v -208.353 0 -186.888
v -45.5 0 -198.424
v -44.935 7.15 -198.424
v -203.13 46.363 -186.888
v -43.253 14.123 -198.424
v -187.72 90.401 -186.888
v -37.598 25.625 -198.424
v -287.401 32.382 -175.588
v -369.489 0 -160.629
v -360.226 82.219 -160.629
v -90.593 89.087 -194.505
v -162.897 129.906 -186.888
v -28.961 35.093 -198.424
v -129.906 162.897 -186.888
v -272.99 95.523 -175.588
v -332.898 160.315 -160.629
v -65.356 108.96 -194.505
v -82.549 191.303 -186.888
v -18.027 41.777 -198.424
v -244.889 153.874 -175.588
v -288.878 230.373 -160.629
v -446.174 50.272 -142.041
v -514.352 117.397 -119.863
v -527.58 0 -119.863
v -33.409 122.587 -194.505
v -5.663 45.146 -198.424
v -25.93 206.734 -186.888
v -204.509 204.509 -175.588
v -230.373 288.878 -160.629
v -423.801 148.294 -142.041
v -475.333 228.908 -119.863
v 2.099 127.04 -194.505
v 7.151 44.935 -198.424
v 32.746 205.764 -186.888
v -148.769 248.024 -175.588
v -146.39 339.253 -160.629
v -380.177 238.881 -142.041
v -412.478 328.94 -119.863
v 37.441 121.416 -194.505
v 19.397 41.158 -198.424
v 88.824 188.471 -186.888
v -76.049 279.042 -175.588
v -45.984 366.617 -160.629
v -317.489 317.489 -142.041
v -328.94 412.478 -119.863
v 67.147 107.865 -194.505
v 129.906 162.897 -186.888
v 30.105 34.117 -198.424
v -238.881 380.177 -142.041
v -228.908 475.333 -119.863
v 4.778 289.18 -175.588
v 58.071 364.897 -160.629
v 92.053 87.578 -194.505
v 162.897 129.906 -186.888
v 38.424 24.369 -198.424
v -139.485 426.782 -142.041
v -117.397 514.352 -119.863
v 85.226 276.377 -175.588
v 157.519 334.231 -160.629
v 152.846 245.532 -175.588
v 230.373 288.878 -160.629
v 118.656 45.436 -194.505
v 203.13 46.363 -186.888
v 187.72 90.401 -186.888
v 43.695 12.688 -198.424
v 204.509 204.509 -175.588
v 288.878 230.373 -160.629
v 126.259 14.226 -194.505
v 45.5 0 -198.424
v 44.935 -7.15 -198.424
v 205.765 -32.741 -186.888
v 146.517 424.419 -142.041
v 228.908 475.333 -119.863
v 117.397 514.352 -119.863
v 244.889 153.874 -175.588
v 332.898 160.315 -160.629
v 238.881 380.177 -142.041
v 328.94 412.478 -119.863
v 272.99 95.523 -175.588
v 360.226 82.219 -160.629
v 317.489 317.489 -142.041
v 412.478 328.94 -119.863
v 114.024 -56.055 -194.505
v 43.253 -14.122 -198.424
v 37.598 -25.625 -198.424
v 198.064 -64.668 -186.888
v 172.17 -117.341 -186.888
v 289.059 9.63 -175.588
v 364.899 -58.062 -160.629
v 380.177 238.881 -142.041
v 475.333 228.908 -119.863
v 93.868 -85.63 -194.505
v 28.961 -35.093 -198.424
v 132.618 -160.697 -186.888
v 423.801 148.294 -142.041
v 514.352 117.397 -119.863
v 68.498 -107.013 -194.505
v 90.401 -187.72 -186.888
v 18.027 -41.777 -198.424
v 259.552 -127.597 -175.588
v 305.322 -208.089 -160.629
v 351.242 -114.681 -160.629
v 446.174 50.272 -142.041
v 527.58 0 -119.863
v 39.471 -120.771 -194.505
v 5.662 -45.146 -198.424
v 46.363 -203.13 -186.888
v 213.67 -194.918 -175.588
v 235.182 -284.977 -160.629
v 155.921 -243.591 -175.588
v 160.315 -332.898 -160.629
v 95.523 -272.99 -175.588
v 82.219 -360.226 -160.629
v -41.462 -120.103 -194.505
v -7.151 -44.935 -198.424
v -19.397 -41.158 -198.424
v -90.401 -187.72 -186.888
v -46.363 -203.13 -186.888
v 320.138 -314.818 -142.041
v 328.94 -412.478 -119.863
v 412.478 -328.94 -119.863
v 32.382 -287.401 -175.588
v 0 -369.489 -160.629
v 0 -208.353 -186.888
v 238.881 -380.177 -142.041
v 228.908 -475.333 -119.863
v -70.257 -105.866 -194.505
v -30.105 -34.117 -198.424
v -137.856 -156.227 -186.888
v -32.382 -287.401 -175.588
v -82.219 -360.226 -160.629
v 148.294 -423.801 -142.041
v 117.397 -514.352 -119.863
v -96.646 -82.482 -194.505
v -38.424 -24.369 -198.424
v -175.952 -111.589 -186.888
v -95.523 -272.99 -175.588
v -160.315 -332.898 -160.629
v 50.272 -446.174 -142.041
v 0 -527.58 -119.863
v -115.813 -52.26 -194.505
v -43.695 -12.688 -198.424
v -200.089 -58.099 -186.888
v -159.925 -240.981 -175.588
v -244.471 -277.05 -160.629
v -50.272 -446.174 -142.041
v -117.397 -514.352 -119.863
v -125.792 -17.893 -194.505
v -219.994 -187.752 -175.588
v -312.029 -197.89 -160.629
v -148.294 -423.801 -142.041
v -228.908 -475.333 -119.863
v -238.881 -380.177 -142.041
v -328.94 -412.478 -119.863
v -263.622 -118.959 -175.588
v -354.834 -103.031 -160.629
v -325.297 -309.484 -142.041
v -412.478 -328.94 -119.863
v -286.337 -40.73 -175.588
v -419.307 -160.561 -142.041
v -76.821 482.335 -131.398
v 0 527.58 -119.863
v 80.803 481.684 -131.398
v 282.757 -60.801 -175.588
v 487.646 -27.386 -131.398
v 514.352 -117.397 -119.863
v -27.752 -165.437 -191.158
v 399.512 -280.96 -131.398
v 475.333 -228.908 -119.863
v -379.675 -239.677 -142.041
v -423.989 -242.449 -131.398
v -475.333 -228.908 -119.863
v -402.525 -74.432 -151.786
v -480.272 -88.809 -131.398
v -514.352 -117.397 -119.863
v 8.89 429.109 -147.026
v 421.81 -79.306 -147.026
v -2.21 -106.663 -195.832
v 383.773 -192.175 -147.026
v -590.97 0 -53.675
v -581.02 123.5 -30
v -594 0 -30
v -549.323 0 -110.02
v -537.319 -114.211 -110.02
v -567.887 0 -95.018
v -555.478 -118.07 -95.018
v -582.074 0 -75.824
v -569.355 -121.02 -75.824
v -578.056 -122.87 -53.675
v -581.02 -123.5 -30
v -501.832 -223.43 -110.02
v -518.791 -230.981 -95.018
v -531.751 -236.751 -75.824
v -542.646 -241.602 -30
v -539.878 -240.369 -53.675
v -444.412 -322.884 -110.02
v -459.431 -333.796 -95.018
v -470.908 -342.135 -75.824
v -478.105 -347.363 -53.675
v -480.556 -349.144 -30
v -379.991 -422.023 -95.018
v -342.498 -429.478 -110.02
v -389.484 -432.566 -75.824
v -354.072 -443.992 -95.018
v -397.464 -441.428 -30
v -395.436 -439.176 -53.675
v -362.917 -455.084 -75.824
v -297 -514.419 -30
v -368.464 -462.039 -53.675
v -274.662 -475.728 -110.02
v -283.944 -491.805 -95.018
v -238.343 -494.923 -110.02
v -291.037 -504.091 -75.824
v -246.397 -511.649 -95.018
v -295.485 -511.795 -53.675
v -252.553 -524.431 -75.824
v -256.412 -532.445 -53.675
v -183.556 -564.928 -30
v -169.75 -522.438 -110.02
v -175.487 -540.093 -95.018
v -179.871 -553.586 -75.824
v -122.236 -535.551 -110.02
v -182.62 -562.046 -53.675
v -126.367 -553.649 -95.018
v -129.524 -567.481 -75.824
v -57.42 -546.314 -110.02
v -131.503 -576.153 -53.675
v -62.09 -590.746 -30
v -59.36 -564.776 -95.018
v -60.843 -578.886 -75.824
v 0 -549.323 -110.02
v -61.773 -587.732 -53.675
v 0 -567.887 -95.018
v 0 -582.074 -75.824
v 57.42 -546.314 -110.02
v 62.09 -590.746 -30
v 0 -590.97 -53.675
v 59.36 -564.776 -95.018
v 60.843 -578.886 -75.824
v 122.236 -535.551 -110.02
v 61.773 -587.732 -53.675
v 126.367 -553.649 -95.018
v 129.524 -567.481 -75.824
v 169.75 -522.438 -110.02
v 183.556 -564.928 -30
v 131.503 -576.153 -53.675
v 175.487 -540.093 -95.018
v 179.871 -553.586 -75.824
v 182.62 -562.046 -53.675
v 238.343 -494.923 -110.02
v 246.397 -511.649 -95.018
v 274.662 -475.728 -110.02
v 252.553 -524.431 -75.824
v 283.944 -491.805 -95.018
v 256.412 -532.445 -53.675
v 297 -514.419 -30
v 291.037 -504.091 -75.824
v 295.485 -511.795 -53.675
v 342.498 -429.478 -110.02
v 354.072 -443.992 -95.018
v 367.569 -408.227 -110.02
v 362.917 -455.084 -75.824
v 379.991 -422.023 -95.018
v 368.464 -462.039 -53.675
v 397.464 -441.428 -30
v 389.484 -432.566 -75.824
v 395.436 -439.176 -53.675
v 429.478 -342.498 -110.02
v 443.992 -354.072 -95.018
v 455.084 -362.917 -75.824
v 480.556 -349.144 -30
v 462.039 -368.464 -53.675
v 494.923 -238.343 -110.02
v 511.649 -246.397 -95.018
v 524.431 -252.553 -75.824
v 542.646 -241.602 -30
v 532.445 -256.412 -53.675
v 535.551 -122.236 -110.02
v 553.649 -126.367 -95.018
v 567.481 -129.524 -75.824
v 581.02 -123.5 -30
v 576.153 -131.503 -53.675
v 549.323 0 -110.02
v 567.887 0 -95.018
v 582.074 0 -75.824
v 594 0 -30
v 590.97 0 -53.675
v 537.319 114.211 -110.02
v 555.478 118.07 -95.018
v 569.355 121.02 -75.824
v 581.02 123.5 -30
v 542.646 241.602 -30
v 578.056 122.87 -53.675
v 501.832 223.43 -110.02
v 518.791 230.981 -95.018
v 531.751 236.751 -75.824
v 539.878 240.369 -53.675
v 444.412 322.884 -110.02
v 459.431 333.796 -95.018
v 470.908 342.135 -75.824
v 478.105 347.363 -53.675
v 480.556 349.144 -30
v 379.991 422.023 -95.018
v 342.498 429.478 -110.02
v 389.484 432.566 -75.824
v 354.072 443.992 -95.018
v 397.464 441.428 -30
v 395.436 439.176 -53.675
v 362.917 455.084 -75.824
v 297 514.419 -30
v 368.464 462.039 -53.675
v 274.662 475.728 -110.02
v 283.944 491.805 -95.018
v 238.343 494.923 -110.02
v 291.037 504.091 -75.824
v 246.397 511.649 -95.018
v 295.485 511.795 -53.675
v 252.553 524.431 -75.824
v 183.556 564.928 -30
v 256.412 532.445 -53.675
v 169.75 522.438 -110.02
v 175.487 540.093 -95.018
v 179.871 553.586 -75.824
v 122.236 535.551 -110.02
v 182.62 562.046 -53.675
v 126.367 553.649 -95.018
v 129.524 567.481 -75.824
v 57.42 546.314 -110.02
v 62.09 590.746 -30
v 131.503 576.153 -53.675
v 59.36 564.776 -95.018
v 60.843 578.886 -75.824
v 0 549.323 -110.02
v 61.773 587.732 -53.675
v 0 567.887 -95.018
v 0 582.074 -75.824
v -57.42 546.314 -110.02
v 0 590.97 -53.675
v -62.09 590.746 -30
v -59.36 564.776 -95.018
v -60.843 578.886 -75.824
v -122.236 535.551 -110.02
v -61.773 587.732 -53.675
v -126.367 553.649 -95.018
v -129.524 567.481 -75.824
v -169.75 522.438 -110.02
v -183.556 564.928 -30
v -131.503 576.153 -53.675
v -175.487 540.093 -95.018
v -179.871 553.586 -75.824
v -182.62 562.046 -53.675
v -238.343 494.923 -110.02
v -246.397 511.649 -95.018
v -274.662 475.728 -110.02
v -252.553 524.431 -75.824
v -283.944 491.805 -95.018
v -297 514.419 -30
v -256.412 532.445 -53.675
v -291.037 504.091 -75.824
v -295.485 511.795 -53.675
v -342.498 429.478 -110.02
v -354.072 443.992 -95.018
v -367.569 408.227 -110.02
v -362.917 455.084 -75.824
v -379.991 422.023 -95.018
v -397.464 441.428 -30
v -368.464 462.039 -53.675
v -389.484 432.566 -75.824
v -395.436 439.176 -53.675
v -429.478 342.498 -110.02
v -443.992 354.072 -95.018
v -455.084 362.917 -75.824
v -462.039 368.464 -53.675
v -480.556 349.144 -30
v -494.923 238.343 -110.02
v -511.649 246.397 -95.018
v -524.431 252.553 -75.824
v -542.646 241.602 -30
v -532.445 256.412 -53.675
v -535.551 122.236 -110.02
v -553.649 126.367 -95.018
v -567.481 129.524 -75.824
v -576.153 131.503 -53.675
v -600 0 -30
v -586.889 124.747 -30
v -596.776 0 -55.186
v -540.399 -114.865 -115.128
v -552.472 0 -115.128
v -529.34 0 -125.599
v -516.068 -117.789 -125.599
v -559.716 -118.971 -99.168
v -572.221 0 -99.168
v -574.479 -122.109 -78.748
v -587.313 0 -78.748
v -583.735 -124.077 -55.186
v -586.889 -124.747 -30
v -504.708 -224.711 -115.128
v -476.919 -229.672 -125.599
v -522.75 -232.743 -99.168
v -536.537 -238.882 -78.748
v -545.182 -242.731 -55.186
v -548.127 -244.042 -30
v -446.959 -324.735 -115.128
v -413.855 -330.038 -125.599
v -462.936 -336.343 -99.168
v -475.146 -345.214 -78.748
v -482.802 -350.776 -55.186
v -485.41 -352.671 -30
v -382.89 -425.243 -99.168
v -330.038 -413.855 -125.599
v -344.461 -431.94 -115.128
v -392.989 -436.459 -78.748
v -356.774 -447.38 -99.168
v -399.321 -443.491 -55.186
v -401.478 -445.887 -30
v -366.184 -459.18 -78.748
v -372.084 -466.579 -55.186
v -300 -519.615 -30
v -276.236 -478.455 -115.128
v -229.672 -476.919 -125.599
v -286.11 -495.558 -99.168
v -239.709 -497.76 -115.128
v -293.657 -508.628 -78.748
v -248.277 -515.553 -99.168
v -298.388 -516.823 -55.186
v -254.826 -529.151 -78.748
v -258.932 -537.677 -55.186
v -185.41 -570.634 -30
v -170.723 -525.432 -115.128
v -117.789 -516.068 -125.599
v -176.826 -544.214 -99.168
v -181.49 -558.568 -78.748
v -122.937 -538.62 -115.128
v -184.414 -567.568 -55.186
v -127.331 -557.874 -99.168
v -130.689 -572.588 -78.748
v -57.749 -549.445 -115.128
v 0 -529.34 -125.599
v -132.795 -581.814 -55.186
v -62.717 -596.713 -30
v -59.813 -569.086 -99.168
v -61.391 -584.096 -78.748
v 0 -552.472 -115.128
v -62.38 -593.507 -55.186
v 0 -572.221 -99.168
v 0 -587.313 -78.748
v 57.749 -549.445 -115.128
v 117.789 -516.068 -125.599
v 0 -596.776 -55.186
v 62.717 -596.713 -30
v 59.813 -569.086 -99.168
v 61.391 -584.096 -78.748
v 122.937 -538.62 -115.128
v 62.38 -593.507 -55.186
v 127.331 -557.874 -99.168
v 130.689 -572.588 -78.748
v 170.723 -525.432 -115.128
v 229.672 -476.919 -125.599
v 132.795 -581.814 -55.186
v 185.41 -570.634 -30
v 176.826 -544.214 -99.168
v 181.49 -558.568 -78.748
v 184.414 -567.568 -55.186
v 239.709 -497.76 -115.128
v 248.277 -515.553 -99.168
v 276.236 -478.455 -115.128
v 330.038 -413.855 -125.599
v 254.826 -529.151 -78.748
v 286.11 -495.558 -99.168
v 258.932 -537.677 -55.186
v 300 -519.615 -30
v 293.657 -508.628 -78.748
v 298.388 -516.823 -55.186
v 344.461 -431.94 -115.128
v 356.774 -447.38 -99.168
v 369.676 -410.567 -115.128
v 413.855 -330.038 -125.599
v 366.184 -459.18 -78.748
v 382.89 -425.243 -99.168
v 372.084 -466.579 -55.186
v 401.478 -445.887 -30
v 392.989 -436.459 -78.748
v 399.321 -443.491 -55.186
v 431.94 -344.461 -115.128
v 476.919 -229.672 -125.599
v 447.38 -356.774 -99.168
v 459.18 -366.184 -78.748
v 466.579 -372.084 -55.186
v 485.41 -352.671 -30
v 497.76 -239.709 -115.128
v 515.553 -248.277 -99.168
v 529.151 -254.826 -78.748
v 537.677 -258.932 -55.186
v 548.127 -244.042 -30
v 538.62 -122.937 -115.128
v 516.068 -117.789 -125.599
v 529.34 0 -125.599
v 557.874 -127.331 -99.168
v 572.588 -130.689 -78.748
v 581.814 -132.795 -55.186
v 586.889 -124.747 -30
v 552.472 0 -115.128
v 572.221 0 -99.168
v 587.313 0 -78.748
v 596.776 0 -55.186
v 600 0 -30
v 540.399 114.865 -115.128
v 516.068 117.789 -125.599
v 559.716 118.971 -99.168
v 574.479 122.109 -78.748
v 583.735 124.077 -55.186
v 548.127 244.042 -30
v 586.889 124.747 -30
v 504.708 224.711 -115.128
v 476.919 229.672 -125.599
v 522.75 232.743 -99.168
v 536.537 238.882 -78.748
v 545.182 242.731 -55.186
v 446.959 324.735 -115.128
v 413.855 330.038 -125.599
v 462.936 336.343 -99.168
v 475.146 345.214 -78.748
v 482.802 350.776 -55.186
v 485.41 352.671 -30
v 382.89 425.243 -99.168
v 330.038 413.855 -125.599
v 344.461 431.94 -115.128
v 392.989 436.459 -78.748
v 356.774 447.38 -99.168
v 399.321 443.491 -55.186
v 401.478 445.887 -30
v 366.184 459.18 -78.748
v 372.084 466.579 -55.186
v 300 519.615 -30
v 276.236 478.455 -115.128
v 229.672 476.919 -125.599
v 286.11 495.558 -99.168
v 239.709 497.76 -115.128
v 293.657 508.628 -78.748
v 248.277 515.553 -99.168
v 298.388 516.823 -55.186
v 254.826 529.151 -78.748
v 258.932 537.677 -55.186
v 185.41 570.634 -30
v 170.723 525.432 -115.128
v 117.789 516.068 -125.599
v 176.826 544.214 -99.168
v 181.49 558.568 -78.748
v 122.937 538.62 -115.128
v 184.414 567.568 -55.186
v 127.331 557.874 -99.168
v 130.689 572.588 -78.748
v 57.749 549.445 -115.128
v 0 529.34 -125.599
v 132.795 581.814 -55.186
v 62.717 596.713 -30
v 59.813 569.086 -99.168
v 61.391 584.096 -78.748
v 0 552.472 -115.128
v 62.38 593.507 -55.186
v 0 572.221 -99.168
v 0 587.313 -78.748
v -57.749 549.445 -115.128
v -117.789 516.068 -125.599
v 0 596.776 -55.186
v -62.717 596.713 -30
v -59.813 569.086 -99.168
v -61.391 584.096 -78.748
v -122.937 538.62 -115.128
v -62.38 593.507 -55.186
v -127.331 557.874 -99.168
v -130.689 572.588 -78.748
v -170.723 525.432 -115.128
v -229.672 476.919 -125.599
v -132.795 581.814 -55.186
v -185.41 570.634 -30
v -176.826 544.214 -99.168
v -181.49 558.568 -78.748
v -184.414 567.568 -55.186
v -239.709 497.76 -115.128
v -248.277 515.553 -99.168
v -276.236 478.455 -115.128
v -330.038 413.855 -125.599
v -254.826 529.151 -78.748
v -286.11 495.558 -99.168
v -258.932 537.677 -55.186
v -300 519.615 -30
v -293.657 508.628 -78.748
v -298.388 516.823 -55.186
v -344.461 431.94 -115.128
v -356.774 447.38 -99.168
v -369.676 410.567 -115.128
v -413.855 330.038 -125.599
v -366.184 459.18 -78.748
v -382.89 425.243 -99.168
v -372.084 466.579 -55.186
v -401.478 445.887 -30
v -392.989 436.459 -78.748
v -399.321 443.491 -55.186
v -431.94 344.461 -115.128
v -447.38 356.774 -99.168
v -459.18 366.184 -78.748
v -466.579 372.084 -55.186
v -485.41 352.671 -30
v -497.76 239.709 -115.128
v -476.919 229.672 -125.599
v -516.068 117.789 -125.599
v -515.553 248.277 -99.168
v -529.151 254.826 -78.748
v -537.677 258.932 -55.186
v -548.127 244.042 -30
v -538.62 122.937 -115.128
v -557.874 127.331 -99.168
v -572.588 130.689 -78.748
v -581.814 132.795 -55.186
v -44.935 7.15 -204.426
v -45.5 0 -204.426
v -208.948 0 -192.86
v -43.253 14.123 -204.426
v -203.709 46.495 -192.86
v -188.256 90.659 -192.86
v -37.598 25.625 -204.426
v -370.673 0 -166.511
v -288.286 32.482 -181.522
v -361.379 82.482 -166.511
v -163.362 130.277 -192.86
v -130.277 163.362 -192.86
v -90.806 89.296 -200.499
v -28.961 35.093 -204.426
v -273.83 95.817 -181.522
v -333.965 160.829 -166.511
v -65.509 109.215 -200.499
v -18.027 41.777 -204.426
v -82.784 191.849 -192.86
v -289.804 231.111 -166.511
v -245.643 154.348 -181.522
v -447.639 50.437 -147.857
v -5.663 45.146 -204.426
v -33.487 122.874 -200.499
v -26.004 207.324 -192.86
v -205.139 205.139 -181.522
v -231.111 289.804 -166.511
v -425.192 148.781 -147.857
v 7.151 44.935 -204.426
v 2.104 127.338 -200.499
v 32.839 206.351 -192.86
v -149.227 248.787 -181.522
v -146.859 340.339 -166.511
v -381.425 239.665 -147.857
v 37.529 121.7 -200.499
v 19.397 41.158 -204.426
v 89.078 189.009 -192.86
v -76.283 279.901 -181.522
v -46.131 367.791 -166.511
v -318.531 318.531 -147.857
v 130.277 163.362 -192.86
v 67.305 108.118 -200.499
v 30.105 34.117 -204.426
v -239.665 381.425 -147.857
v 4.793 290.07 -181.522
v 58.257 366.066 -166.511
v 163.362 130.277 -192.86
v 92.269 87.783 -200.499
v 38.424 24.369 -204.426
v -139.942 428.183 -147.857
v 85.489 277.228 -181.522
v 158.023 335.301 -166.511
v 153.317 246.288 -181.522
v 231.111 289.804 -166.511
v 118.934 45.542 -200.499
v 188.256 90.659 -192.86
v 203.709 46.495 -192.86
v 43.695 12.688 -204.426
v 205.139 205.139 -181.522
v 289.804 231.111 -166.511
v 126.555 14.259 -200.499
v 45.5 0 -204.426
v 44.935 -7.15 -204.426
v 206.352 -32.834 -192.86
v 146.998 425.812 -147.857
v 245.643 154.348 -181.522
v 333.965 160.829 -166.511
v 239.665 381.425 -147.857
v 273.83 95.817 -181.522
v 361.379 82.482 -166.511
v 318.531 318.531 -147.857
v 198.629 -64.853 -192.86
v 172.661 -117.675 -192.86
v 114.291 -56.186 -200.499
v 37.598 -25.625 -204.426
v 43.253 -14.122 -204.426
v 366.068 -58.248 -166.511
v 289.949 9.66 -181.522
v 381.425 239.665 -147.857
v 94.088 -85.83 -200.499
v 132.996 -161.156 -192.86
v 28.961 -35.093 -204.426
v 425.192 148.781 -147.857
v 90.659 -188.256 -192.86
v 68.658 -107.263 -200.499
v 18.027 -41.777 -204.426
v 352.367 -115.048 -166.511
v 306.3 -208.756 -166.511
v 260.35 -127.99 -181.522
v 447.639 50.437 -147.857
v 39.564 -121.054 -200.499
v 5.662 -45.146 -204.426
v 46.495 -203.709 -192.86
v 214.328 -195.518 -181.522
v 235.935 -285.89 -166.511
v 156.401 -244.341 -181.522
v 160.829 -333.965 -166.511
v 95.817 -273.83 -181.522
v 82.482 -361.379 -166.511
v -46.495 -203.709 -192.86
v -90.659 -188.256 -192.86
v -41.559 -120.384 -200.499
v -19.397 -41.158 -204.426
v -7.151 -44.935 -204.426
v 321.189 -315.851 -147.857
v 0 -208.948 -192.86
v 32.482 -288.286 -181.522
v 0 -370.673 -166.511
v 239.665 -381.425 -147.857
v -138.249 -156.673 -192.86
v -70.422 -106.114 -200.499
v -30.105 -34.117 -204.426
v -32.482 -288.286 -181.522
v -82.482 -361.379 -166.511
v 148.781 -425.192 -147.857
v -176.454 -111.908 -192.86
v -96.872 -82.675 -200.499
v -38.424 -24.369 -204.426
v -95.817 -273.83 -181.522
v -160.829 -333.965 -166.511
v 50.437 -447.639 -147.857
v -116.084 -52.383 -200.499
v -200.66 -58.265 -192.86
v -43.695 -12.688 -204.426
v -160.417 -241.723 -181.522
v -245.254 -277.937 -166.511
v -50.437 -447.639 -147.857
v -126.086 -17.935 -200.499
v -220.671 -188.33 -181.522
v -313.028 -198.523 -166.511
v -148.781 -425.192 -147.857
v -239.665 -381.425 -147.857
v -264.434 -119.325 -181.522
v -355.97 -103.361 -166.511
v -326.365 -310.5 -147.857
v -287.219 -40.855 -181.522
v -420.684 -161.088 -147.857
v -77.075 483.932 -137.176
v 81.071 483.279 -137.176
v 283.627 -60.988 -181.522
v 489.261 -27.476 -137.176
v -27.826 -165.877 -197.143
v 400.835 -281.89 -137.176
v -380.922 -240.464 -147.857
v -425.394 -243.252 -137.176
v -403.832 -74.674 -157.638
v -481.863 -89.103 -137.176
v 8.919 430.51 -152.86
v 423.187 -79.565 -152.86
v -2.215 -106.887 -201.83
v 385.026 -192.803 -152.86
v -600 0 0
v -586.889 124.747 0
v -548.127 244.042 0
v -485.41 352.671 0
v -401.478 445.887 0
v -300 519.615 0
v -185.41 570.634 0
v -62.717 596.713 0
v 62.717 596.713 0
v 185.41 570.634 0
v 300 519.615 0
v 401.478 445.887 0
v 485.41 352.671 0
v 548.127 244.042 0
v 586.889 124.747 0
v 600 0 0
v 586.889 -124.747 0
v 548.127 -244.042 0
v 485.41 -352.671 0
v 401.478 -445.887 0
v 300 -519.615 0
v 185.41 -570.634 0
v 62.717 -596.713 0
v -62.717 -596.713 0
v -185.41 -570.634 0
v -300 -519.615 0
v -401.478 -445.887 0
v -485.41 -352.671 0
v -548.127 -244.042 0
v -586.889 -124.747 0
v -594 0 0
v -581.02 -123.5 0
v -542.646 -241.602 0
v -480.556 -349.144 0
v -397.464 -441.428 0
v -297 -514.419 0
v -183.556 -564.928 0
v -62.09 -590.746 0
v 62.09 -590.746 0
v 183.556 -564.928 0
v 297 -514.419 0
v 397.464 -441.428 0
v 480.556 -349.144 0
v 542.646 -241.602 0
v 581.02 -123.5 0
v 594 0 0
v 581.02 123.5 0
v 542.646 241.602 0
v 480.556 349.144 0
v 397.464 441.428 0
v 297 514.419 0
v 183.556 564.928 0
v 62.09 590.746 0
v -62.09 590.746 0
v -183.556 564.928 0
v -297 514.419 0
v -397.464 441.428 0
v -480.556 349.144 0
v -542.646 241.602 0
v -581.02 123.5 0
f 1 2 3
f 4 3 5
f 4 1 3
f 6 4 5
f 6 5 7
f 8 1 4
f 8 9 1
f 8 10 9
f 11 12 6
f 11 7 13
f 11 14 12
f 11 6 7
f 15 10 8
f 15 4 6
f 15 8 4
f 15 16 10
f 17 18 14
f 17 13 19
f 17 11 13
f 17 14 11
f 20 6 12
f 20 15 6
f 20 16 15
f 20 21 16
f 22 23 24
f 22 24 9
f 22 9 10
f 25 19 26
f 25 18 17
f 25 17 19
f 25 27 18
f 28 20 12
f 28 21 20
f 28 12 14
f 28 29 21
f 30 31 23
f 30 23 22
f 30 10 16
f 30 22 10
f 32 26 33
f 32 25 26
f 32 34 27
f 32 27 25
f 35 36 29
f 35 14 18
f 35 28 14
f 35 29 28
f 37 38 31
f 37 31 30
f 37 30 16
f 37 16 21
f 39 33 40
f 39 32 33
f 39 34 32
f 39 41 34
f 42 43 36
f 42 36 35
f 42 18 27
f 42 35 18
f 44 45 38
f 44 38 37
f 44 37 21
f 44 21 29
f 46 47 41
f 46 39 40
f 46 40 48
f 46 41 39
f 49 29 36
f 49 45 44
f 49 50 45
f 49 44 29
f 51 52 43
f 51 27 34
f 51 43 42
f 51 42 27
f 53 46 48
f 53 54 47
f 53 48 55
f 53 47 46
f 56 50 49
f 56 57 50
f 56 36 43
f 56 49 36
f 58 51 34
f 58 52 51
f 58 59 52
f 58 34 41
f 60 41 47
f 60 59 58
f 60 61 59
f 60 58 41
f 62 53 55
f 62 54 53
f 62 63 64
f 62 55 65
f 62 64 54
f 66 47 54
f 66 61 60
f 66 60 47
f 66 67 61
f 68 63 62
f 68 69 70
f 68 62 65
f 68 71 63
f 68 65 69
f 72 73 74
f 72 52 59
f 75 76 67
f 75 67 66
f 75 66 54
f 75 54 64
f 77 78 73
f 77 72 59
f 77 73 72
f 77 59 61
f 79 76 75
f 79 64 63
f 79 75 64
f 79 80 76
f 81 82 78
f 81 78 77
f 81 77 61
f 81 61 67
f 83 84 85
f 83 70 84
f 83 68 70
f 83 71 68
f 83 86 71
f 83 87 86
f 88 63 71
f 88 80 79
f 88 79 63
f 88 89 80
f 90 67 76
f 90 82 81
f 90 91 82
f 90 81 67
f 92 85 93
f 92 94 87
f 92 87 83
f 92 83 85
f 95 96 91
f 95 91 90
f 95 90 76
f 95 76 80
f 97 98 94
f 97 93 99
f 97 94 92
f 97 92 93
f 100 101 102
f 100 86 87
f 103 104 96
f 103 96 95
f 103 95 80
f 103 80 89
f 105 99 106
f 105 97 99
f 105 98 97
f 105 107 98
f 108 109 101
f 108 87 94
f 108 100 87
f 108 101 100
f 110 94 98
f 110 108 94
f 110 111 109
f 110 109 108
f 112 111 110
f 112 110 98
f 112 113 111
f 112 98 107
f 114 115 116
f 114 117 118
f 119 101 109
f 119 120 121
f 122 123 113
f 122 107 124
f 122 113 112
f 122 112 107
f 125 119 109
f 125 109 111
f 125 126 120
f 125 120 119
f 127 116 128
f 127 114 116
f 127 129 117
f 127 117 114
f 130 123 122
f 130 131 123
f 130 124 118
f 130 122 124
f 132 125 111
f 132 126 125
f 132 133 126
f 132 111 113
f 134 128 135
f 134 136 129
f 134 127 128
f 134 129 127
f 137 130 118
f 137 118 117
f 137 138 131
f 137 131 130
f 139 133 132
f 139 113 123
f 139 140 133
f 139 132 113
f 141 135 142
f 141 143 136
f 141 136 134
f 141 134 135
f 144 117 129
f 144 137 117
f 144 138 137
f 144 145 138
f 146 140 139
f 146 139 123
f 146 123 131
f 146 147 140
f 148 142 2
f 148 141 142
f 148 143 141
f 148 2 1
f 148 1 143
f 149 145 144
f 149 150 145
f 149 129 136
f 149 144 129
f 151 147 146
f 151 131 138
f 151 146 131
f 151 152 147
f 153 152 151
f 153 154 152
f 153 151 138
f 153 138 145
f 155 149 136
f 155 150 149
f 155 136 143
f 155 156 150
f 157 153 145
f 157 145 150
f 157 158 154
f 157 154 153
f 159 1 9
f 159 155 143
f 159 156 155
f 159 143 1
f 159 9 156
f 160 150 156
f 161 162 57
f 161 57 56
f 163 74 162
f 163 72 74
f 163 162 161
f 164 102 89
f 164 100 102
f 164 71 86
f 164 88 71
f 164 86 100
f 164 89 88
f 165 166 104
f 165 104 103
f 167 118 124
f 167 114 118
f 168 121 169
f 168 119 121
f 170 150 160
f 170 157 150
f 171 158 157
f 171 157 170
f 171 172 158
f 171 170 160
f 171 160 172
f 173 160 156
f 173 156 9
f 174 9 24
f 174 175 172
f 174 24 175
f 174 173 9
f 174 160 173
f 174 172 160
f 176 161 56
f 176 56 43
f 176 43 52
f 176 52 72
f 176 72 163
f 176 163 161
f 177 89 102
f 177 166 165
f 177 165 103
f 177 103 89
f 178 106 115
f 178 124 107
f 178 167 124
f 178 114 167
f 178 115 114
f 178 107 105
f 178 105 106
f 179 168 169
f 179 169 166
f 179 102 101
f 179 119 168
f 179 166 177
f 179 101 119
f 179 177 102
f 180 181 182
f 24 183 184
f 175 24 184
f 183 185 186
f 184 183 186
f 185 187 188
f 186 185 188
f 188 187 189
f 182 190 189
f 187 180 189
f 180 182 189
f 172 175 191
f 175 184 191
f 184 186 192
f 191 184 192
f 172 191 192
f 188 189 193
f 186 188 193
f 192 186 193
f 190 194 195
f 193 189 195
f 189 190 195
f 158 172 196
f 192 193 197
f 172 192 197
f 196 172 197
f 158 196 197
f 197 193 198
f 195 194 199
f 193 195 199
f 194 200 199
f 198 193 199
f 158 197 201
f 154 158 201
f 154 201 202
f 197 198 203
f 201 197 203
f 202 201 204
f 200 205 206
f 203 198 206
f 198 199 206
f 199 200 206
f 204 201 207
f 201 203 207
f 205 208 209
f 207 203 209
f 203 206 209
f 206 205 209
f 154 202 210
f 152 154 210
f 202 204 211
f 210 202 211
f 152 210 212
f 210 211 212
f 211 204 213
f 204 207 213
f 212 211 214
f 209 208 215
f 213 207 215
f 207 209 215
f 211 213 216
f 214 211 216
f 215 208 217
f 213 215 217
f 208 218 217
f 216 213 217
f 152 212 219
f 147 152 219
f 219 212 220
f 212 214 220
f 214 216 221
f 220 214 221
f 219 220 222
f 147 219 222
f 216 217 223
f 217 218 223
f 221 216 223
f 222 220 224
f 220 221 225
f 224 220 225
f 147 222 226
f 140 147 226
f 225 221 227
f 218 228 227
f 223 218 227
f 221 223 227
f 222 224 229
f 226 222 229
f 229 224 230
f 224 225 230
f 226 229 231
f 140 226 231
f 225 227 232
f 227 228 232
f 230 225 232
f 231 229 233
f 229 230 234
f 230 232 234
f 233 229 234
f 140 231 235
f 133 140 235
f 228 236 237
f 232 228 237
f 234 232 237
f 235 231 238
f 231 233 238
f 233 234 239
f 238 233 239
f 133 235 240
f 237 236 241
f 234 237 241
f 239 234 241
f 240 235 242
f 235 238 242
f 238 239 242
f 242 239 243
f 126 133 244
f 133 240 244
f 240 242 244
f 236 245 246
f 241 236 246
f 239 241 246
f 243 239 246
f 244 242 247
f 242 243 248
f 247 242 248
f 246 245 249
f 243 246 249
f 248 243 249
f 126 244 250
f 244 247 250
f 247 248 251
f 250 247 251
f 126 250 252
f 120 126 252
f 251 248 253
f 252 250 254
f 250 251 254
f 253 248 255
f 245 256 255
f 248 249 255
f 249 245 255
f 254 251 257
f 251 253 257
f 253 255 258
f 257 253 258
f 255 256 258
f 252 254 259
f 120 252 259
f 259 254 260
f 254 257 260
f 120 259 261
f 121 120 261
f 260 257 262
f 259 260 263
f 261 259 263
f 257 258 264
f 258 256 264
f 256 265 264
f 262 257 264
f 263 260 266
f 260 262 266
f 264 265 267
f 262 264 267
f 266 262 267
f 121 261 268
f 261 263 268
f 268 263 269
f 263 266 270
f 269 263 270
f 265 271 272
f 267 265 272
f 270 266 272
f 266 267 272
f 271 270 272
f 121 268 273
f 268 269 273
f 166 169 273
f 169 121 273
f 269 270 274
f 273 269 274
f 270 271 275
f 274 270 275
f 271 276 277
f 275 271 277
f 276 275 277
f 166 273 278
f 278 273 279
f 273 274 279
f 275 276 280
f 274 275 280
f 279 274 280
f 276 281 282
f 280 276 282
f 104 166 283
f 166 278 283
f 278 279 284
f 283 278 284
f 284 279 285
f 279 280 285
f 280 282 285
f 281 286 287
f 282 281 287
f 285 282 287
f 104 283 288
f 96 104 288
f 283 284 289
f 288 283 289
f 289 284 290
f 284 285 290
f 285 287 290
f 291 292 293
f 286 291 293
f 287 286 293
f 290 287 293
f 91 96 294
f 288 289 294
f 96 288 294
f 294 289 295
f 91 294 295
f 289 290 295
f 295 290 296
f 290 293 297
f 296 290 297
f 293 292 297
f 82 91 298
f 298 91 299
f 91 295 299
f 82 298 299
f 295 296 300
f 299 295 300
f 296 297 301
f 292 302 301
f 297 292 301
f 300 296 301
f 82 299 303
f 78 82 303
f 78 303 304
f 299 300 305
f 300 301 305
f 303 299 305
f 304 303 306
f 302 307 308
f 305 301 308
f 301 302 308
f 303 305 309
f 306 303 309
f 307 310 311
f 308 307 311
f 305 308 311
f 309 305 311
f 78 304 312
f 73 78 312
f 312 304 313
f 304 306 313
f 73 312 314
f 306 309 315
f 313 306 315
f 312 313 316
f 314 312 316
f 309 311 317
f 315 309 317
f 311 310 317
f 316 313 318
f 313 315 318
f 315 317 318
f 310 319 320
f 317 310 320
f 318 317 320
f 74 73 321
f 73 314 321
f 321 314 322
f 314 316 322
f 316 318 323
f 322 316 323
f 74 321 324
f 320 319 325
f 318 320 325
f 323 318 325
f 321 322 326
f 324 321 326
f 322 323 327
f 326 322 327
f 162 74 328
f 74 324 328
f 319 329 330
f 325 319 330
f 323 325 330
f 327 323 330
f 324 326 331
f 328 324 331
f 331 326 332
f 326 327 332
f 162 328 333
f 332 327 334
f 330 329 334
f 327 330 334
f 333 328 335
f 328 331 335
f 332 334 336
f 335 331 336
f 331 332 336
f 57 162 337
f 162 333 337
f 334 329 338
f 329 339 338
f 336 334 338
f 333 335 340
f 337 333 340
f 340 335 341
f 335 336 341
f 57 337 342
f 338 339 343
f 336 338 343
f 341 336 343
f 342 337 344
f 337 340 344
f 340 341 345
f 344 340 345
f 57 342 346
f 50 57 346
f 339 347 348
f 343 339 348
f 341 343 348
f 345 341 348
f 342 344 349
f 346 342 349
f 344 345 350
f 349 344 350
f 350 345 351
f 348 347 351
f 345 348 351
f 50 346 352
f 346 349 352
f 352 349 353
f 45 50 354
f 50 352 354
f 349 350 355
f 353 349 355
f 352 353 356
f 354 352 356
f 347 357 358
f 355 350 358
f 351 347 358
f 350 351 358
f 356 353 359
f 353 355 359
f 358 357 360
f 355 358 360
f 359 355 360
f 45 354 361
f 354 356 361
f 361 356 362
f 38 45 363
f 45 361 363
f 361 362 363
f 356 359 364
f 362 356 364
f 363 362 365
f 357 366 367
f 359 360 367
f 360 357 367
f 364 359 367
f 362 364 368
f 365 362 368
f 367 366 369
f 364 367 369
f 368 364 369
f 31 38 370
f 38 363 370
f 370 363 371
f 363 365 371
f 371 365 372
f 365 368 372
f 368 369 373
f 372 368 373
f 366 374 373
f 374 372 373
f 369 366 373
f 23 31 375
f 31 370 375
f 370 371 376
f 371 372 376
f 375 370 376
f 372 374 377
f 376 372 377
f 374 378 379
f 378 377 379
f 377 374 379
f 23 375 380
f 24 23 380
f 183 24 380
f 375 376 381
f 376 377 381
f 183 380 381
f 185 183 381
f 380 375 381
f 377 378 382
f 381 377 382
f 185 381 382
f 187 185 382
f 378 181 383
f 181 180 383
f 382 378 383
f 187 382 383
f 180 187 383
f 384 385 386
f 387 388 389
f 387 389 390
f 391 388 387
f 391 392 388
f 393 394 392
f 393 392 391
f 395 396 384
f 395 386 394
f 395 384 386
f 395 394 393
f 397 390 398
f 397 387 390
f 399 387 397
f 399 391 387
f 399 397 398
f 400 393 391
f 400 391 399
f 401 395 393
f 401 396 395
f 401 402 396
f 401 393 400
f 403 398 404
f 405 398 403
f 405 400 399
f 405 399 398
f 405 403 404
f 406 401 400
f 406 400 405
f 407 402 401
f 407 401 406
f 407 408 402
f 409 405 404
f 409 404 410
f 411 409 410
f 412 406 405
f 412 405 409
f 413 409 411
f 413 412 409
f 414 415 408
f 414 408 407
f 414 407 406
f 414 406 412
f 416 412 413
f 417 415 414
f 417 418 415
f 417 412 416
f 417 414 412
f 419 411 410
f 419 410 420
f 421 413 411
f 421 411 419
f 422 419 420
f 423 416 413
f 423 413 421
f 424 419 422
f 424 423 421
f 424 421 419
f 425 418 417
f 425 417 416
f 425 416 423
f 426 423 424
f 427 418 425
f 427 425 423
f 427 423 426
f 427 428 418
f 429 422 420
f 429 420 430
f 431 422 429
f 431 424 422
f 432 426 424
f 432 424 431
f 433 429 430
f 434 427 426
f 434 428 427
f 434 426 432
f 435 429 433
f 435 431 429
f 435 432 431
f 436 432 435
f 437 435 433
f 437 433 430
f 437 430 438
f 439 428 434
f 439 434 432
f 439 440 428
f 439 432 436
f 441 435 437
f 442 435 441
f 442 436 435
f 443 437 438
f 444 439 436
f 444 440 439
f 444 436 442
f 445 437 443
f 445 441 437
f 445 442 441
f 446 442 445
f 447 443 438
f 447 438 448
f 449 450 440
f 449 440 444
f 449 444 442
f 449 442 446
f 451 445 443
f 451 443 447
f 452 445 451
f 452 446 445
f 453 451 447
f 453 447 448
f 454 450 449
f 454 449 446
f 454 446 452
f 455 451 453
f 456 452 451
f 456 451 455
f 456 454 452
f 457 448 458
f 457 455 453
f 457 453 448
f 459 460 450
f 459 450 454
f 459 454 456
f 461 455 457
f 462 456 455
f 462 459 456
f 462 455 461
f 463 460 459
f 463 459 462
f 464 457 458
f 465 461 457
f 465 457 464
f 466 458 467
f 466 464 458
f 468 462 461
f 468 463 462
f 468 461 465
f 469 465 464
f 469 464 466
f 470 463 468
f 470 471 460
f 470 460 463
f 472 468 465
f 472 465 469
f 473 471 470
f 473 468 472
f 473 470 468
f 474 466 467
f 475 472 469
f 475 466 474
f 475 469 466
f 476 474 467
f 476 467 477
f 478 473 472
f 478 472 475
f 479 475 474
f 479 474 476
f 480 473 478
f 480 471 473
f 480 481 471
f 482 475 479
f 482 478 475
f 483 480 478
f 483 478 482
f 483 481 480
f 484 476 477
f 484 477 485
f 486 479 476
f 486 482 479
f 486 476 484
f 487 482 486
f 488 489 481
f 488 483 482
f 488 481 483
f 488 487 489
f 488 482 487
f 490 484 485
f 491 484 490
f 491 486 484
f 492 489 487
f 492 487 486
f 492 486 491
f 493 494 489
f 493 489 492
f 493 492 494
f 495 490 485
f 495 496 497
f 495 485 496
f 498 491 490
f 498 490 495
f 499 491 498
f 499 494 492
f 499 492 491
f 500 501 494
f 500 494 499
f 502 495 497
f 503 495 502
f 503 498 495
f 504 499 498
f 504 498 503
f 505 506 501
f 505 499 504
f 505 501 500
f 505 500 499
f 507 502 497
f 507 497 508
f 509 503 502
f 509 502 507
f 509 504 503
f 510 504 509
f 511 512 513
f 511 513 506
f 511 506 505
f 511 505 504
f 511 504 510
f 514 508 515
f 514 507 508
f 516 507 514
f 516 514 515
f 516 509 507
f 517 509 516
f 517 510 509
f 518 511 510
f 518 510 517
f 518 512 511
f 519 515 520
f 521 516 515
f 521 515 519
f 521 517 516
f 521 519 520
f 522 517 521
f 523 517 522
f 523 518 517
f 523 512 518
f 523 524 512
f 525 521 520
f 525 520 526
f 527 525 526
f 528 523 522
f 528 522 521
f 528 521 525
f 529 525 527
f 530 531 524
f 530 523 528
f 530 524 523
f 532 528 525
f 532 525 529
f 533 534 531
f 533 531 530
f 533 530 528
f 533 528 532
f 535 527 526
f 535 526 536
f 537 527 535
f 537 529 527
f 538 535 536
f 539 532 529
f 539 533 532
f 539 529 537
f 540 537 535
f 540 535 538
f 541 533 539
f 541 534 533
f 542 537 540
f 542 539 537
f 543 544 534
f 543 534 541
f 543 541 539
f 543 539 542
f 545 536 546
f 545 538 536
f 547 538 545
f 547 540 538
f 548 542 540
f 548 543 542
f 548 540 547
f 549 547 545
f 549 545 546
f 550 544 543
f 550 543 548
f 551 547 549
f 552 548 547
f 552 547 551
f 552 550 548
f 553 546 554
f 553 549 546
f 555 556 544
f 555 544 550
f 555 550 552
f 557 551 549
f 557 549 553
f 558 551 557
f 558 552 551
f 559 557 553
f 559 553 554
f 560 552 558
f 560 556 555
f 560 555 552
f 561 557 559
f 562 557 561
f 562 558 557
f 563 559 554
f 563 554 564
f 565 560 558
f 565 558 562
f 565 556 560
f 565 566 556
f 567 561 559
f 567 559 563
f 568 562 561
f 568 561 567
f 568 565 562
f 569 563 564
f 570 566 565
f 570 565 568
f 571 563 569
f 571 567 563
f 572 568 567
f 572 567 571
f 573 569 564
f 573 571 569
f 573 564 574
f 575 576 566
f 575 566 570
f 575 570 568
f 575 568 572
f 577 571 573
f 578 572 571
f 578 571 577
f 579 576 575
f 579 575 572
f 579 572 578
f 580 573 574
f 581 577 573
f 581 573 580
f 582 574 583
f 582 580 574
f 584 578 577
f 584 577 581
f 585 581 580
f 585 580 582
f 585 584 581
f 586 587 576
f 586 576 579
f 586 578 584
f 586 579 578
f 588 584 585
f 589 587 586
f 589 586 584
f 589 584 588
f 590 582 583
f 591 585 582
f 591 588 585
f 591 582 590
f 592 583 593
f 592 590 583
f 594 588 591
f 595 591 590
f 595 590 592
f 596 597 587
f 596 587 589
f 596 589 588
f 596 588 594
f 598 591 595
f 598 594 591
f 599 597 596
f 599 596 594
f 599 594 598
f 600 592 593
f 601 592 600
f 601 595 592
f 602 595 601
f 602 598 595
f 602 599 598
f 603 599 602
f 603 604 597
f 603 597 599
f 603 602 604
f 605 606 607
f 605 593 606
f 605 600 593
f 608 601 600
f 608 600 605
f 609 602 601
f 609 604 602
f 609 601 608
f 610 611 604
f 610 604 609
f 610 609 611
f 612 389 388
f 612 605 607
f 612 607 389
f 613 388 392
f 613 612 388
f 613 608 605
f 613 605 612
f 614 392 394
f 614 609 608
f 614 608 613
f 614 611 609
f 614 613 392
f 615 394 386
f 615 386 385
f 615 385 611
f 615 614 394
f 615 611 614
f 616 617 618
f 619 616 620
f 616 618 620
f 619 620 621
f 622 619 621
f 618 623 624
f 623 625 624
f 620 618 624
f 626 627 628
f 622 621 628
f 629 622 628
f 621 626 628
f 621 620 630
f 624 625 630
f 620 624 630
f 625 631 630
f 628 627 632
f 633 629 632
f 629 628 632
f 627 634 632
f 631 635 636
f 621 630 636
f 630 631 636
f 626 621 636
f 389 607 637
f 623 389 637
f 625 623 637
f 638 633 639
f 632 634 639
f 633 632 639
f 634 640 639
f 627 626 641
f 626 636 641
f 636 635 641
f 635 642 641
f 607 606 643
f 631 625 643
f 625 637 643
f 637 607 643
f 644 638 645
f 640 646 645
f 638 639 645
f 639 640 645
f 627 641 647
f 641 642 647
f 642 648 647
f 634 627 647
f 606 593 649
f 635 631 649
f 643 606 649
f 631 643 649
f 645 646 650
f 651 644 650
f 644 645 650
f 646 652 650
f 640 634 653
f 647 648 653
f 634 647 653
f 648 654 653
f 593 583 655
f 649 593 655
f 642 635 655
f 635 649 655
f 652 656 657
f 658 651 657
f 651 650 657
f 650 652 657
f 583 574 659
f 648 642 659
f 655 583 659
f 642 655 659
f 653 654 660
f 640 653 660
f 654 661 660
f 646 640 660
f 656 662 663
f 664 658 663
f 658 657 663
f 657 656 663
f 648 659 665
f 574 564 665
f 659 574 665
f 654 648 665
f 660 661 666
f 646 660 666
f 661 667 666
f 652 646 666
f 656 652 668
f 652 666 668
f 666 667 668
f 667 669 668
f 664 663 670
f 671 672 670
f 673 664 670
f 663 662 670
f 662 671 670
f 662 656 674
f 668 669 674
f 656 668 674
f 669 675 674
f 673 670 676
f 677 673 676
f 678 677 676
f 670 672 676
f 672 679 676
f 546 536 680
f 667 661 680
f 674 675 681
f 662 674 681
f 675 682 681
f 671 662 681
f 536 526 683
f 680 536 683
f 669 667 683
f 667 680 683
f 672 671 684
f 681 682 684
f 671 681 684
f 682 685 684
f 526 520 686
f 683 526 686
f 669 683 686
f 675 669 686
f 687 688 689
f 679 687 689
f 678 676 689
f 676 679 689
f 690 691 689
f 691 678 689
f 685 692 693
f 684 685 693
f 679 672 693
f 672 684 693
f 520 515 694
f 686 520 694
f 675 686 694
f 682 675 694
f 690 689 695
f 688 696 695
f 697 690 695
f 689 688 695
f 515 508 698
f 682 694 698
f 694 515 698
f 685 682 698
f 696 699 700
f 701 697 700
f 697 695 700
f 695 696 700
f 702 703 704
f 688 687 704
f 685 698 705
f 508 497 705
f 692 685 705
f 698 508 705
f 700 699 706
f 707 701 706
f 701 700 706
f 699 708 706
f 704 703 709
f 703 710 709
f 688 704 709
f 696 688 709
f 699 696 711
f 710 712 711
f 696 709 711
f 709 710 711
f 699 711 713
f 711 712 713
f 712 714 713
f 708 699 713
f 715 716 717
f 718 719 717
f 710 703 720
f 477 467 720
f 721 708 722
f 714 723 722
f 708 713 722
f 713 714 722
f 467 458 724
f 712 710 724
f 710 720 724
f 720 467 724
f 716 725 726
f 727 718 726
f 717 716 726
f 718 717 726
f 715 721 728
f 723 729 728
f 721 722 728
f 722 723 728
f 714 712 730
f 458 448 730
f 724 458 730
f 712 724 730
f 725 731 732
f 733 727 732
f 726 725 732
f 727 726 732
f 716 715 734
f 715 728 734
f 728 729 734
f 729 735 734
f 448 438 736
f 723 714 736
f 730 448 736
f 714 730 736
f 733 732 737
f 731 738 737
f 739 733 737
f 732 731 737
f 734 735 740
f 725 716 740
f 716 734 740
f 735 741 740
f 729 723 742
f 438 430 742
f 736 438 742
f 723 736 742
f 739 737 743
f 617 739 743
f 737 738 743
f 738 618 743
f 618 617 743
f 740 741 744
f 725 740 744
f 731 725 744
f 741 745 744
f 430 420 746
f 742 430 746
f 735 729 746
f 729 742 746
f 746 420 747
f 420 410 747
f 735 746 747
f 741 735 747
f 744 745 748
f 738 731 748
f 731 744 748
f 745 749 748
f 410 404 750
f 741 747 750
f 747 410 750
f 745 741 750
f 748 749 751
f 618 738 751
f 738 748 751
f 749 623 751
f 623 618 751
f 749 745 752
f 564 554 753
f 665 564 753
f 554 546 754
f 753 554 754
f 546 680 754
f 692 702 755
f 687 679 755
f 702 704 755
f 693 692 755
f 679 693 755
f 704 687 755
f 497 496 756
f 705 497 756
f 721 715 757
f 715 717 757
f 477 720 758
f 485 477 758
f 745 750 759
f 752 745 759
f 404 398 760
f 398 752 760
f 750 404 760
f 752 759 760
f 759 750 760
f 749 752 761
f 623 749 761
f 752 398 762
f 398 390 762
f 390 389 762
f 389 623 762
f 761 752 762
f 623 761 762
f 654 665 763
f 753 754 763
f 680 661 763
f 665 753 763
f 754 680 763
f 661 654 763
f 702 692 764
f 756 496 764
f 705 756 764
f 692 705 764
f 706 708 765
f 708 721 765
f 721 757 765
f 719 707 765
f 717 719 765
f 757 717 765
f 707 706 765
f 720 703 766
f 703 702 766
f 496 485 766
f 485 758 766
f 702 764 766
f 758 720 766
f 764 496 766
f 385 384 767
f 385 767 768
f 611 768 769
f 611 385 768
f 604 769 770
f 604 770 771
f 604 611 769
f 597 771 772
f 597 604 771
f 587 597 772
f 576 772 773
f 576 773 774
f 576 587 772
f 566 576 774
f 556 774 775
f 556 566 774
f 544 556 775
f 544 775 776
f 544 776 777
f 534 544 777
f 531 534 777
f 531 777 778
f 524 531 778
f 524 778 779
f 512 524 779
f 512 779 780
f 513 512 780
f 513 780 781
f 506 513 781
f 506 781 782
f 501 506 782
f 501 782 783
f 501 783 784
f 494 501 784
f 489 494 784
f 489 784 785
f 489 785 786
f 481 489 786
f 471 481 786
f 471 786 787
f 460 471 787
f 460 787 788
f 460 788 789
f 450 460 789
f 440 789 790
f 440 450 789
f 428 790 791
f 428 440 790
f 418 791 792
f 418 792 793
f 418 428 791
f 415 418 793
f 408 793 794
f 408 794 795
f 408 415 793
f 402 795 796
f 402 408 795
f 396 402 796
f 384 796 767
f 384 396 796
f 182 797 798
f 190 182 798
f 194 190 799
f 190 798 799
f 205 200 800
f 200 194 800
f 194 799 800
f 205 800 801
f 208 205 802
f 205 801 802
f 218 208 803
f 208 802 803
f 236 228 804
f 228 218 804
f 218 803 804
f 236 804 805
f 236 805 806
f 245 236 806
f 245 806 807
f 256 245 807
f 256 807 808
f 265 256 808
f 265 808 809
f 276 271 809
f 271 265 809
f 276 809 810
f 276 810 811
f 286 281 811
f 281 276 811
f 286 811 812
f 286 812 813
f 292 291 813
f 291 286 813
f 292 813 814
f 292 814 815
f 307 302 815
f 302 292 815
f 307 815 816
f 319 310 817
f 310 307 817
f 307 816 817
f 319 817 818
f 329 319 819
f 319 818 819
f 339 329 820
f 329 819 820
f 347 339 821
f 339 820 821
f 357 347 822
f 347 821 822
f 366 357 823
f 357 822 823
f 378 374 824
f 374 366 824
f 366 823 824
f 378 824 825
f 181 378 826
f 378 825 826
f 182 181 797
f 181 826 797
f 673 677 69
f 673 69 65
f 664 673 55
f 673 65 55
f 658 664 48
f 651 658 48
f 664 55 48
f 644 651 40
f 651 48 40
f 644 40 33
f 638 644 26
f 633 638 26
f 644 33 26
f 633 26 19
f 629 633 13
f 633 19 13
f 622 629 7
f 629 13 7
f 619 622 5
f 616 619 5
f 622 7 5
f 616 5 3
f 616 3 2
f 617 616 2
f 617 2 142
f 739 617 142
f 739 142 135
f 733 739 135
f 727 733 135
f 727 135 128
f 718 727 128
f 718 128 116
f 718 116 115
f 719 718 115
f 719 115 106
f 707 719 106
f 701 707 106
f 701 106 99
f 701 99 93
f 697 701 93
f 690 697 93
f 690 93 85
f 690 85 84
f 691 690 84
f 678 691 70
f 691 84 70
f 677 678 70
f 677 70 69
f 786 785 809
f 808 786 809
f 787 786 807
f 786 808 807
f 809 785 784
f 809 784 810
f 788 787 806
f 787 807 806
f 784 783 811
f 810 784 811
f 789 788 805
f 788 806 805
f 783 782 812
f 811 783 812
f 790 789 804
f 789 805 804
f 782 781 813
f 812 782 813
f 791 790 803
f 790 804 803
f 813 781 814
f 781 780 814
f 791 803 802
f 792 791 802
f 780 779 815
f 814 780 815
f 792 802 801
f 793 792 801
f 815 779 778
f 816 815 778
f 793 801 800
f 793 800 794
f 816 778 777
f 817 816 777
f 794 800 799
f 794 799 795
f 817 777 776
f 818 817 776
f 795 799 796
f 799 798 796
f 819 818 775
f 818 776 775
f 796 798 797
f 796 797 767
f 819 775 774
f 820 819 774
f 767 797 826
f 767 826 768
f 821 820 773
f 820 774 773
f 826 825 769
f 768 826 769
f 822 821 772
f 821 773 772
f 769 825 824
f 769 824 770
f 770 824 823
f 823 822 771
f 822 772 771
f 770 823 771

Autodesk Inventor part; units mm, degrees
ref_plane "YZ Plane" through (0, 0, 0) normal (1, 0, 0) x (0, 1, 0)
ref_plane "XZ Plane" through (0, 0, 0) normal (0, 1, 0) x (-1, 0, 0)
ref_plane "XY Plane" through (0, 0, 0) normal (0, 0, 1) x (1, 0, 0)
sketch "Sketch1" plane through (0, 0, 0) normal (0, 1, 0) x (-1, 0, 0)
  line L0 (600, 0) -> (600, -30)
  arc A0 (529.3399, -125.599) -> (600, -30) centre (500, -30) ccw
  arc A1 (0, -205) -> (529.3399, -125.599) centre (0, 1599.1667) ccw
  line L1 (0, 191.6842) -> (0, -191.6842)
  arc A2 (0, -199) -> (527.5795, -119.8631) centre (0, 1599.1667) ccw
  arc A3 (527.5795, -119.8631) -> (594, -30) centre (500, -30) ccw
  line L2 (594, -30) -> (594, 0)
  line L3 (594, 0) -> (600, 0)
  line L4 (0, -199) -> (0, -205)
  point P0 (0, 0)
  point P1 (0, 0)
  point P2 (0, -202)
  point P3 (0, -163.7009)
  point P4 (0, -169.7009)
  dimension "d0" = 100
  dimension "d1" = 30
  dimension "d3" = 1804.1667
  dimension "d6" = 6
  dimension "d11" = 1188
  dimension "d12" = 205
revolve "Revolution1" add sketch "Sketch1" angle 360 about axis through (0, 0, 191.6842) along (0, 0, -1)
sketch "Sketch2" plane through (0, 0, 0) normal (0, 0, 1) x (1, 0, 0)
  circle A0 centre (0, 0) radius 45.5
  dimension "d8" = 91
extrude "Extrusion1" cut sketch "Sketch2" against normal through all
equation "\"d11\" = MAIN_filter_diam"
equation "\"MAIN_filter_diam\" = 1188"
equation "\"Disherd_head_hight\" = d12"
properties part number "PRS 940-02 dished head" material "Steel"
